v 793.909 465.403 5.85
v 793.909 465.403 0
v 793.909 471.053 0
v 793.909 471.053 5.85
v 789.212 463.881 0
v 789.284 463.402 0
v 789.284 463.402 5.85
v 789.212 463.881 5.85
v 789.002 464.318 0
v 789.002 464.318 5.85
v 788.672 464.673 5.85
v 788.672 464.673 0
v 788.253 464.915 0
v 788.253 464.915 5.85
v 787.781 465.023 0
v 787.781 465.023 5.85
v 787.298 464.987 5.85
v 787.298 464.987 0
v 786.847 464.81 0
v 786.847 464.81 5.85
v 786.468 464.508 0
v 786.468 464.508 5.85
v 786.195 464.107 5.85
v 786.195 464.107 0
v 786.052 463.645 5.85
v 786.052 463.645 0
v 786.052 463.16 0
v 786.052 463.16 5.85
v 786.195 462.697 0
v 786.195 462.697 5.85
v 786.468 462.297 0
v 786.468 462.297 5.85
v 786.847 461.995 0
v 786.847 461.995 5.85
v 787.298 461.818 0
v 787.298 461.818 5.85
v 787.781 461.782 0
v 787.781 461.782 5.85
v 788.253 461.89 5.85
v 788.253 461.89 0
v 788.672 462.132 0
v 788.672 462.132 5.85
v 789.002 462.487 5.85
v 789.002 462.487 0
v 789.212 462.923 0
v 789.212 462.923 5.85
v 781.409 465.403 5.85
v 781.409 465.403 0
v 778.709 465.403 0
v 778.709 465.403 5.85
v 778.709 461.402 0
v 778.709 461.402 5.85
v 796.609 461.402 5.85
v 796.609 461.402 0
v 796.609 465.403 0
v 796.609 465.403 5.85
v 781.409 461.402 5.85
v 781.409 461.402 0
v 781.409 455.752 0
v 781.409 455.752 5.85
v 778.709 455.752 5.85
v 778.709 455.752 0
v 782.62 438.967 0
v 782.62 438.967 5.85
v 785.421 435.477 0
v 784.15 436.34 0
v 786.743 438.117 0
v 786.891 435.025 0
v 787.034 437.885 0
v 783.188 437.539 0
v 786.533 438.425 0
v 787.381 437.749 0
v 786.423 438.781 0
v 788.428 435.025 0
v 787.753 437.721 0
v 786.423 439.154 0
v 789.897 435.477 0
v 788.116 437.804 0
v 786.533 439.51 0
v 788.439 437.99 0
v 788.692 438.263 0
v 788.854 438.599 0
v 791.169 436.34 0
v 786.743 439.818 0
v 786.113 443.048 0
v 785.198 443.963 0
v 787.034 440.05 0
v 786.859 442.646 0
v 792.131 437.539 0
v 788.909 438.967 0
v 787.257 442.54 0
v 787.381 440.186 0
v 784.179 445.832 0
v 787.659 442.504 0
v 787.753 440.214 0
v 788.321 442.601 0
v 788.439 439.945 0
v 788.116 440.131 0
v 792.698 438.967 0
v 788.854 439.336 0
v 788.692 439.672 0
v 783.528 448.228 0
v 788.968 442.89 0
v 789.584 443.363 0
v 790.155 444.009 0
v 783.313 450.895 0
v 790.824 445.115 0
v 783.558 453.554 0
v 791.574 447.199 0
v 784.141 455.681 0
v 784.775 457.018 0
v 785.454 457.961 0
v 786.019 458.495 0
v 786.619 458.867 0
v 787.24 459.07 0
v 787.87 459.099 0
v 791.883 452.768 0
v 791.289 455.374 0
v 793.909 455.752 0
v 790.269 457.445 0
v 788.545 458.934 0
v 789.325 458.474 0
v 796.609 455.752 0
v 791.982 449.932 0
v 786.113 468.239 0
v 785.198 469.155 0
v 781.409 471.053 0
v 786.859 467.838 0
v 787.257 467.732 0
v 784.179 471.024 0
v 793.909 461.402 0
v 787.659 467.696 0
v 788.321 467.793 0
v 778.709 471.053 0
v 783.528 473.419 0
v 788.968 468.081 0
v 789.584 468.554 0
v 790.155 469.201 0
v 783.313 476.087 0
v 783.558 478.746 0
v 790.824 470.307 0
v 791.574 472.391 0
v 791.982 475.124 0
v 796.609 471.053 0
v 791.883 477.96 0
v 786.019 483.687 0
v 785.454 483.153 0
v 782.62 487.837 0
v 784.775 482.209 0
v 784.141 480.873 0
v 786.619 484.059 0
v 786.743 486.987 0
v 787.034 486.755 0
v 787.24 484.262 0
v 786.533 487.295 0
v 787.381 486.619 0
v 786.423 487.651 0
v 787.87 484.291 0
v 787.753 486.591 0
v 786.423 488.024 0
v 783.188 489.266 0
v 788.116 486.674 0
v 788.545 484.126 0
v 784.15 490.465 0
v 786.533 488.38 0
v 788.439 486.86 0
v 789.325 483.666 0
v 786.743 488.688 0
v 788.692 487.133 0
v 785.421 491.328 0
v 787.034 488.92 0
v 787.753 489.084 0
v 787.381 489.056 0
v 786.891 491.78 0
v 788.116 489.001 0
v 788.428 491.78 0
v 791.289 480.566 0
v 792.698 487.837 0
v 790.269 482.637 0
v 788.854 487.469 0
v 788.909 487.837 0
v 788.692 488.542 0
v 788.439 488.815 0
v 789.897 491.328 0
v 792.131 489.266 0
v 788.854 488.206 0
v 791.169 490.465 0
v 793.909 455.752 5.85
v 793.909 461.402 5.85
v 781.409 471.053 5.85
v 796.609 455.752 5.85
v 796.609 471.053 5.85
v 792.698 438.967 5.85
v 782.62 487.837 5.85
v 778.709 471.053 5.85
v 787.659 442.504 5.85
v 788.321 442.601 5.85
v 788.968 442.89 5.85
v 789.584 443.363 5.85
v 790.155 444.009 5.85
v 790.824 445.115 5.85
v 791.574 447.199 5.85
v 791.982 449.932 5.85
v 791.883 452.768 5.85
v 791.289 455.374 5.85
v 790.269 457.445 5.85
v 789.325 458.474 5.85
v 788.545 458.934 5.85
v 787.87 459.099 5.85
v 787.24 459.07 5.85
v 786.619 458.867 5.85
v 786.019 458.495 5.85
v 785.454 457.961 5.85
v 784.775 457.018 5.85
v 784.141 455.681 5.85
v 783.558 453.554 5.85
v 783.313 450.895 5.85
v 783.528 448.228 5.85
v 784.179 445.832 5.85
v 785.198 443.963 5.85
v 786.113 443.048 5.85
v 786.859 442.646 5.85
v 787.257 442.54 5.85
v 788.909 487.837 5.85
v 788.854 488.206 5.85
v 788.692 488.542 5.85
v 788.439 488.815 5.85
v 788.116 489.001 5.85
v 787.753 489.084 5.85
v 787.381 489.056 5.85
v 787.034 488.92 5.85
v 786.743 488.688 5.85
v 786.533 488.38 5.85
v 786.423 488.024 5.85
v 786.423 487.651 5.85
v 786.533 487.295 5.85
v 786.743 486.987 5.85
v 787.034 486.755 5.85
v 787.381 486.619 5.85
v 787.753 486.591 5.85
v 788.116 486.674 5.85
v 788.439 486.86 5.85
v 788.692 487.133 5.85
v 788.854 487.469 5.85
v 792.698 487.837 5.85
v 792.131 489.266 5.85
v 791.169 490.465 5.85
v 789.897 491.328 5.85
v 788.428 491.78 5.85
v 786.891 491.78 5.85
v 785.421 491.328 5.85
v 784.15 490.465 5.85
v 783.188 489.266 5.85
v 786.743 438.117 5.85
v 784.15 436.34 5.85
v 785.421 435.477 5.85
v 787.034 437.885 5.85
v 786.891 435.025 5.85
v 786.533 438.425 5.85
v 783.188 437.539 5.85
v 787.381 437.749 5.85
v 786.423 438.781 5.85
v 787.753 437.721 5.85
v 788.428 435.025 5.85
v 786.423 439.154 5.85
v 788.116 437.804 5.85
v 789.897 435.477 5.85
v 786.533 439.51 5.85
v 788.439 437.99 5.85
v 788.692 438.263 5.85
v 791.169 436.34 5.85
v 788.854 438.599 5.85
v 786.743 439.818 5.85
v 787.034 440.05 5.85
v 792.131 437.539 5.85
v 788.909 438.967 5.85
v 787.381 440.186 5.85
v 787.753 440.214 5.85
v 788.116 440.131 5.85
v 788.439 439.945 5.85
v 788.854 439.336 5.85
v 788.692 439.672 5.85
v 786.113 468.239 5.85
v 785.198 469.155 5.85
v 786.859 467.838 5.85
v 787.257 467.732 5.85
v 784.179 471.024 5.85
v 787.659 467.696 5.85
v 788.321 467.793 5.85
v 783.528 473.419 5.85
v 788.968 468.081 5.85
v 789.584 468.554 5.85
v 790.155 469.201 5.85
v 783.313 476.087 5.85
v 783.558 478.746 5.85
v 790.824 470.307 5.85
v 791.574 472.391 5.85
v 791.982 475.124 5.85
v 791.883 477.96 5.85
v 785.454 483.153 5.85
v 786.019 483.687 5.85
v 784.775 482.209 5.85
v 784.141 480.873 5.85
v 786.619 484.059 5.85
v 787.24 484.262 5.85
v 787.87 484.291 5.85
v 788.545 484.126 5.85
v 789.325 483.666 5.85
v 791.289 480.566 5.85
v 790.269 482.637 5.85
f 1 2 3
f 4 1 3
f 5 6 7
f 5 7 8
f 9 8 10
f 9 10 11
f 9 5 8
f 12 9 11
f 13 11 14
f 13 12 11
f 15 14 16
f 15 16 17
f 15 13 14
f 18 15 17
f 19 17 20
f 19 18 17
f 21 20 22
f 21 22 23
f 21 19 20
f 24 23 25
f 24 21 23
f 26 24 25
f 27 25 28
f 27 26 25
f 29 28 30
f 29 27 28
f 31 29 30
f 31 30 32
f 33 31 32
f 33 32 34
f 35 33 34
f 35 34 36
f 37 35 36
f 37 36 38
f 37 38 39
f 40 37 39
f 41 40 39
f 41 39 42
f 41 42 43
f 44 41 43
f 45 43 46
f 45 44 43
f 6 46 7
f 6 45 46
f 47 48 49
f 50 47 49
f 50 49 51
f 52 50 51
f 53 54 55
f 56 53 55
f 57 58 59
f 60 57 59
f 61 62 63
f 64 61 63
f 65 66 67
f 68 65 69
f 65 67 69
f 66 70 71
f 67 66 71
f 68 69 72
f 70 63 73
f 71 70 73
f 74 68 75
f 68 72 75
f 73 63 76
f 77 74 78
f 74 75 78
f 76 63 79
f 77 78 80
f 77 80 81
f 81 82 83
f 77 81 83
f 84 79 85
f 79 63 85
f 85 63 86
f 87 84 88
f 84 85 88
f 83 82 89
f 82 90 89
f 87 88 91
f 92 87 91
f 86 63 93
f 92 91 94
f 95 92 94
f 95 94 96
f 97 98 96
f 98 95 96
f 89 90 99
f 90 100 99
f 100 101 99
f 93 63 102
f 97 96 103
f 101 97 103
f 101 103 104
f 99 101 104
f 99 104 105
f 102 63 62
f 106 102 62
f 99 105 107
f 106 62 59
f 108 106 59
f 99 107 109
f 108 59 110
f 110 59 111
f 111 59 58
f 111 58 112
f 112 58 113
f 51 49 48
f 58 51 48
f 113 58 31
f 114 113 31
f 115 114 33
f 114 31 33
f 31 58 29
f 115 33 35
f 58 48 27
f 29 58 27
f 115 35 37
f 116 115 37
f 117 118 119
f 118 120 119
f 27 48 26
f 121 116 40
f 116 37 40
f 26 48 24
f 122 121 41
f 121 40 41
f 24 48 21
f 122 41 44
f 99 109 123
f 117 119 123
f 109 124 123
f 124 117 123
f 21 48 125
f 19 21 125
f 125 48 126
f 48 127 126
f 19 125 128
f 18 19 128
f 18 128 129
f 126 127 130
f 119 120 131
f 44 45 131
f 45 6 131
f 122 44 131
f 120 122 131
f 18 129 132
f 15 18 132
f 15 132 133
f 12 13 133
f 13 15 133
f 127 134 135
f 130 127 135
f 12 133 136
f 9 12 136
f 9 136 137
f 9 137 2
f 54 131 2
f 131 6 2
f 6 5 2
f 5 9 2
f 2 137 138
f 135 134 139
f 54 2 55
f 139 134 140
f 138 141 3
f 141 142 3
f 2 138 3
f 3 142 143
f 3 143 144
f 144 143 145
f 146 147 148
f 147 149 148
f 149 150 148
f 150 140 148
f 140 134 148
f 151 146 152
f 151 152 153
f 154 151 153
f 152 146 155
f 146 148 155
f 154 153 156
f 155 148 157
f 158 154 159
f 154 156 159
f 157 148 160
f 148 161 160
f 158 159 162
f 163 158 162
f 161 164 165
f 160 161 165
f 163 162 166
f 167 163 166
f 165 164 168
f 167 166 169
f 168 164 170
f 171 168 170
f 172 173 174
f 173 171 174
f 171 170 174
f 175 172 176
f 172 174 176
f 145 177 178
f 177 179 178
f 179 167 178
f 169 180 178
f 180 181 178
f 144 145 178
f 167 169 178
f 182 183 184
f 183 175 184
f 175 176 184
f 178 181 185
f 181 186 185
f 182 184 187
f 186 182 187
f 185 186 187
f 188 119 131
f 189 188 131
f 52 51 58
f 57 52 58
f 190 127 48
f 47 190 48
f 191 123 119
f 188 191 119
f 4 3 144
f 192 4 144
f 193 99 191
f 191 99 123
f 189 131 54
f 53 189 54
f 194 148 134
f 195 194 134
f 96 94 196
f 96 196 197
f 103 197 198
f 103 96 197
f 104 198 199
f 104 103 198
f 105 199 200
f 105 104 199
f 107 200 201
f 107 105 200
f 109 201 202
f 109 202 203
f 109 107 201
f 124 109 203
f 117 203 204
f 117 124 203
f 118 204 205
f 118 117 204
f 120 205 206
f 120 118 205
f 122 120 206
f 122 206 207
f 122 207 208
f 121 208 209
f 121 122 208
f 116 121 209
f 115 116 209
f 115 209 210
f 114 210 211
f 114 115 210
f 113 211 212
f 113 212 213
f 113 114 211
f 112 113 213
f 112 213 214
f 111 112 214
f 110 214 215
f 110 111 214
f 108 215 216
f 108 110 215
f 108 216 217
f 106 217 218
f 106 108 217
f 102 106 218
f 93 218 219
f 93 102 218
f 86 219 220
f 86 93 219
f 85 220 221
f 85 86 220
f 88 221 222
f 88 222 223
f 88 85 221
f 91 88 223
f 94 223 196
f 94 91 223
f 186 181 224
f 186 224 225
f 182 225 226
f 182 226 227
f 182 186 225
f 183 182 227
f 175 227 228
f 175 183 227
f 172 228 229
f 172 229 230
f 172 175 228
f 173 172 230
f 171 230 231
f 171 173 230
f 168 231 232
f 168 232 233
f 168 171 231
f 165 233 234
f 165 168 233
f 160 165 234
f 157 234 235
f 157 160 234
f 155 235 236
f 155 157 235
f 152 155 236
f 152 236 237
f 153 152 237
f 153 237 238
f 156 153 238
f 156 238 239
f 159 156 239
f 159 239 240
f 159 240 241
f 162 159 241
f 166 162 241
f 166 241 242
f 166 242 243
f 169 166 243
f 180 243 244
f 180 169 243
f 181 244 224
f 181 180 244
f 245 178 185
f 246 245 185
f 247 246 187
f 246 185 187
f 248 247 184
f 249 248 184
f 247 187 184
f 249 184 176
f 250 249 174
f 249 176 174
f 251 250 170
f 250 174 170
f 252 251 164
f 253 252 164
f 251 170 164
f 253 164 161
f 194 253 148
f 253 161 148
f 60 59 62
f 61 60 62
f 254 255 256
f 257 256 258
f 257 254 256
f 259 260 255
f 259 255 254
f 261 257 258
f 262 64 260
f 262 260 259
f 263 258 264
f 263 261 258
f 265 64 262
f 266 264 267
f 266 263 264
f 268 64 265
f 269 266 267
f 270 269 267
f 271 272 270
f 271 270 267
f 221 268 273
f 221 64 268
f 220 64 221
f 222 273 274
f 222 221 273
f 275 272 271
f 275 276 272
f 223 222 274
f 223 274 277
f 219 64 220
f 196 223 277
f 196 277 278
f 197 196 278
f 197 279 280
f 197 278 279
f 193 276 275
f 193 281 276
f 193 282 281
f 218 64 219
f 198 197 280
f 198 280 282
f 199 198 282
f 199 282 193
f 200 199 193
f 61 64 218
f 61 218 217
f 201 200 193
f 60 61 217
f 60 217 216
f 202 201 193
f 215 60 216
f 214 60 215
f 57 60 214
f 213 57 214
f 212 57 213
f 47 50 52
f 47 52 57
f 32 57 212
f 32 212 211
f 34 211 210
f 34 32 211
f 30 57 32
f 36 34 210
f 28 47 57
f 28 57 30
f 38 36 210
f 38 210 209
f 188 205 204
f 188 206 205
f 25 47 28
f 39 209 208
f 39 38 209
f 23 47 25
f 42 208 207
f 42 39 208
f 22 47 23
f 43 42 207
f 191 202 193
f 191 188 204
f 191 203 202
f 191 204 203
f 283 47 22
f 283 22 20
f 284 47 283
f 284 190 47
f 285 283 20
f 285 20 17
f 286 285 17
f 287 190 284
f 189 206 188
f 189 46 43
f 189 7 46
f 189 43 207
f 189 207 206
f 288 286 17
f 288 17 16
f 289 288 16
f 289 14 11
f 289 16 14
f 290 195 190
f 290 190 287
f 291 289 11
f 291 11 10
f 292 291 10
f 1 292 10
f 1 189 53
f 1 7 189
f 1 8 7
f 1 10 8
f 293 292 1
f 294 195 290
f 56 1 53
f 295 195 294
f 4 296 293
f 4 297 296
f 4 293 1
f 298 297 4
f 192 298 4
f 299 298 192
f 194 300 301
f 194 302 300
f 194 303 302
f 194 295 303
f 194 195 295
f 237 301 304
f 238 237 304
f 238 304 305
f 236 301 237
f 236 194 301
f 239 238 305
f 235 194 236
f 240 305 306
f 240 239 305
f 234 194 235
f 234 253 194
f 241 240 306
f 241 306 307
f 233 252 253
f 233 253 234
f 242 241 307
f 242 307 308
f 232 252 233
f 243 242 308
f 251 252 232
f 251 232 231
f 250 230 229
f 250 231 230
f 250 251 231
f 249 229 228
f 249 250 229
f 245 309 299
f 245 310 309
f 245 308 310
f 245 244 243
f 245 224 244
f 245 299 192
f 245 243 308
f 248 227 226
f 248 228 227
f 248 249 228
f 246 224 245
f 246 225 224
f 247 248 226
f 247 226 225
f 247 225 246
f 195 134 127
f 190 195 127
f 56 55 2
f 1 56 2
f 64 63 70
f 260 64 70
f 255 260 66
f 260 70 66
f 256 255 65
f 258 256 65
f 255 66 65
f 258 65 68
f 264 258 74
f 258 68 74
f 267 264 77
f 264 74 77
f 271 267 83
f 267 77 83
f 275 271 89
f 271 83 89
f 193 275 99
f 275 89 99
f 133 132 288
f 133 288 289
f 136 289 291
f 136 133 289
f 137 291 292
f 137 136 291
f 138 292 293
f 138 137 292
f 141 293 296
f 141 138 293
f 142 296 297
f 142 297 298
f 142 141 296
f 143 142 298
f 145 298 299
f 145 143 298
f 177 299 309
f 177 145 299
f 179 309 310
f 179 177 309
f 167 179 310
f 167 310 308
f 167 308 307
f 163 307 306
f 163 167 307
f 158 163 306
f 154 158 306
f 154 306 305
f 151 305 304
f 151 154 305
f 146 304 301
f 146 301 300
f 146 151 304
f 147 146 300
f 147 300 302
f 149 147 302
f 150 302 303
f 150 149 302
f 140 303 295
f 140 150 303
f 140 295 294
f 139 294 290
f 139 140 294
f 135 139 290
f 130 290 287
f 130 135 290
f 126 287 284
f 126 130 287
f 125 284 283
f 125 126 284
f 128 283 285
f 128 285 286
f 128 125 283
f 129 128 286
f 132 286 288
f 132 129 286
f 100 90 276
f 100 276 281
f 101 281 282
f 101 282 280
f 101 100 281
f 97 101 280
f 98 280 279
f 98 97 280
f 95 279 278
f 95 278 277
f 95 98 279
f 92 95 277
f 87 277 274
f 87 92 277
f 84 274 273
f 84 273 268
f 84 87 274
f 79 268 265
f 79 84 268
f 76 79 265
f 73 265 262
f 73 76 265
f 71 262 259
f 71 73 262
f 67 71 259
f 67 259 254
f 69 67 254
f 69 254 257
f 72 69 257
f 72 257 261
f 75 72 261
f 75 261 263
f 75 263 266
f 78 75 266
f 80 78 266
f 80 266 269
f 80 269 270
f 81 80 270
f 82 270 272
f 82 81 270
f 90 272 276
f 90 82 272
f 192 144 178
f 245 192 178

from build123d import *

# Parameters (mm, degrees)
SKETCH1_R           = 1.25
SKETCH1_R_2         = 1.625
SKETCH1_RX          = 8.302080555
SKETCH1_RY          = 4.346497416
BOSS_EXTRUDE1_DEPTH = 5.85


with BuildPart() as part:
    # Sketch1 → Boss-Extrude1 (new body)
    with BuildSketch(Plane.XY):
        with BuildLine():
            Line((781.409168709, 465.402542), (778.709168709, 465.402542))
            Line((778.709168709, 465.402542), (778.709168709, 461.402176393))
            Line((778.709168709, 461.402176393), (781.409168709, 461.402176393))
            Line((781.409168709, 461.402176393), (781.409168709, 455.752176393))
            Line((781.409168709, 455.752176393), (778.709168709, 455.752176393))
            Line((778.709168709, 455.752176393), (782.620179881, 438.967359197))
            ThreePointArc((782.620179881, 438.967359197), (787.659168709, 434.967516139), (792.698157537, 438.967359197))
            Line((792.698157537, 438.967359197), (796.609168709, 455.752176393))
            Line((796.609168709, 455.752176393), (793.909168709, 455.752176393))
            Line((793.909168709, 455.752176393), (793.909168709, 461.402176393))
            Line((793.909168709, 461.402176393), (796.609168709, 461.402176393))
            Line((796.609168709, 461.402176393), (796.609168709, 465.402542))
            Line((796.609168709, 465.402542), (793.909168709, 465.402542))
            Line((793.909168709, 465.402542), (793.909168709, 471.052542))
            Line((793.909168709, 471.052542), (796.609168709, 471.052542))
            Line((796.609168709, 471.052542), (792.698157537, 487.837359197))
            ThreePointArc((792.698157537, 487.837359197), (787.659168709, 491.837202254), (782.620179881, 487.837359197))
            Line((782.620179881, 487.837359197), (778.709168709, 471.052542))
            Line((778.709168709, 471.052542), (781.409168709, 471.052542))
            Line((781.409168709, 471.052542), (781.409168709, 465.402542))
        make_face()
        with Locations((787.659168709, 487.837359197)):
            Circle(SKETCH1_R, mode=Mode.SUBTRACT)
        with Locations((787.659168709, 438.967359197)):
            Circle(SKETCH1_R, mode=Mode.SUBTRACT)
        with Locations((787.659168709, 463.402359197)):
            Circle(SKETCH1_R_2, mode=Mode.SUBTRACT)
        with Locations(Location((787.659168709, 475.998301041), (0, 0, -90))):
            Ellipse(SKETCH1_RX, SKETCH1_RY, mode=Mode.SUBTRACT)
        with Locations(Location((787.659168709, 450.806417352), (0, 0, -90))):
            Ellipse(SKETCH1_RX, SKETCH1_RY, mode=Mode.SUBTRACT)
    extrude(amount=BOSS_EXTRUDE1_DEPTH)


solid = part.part
